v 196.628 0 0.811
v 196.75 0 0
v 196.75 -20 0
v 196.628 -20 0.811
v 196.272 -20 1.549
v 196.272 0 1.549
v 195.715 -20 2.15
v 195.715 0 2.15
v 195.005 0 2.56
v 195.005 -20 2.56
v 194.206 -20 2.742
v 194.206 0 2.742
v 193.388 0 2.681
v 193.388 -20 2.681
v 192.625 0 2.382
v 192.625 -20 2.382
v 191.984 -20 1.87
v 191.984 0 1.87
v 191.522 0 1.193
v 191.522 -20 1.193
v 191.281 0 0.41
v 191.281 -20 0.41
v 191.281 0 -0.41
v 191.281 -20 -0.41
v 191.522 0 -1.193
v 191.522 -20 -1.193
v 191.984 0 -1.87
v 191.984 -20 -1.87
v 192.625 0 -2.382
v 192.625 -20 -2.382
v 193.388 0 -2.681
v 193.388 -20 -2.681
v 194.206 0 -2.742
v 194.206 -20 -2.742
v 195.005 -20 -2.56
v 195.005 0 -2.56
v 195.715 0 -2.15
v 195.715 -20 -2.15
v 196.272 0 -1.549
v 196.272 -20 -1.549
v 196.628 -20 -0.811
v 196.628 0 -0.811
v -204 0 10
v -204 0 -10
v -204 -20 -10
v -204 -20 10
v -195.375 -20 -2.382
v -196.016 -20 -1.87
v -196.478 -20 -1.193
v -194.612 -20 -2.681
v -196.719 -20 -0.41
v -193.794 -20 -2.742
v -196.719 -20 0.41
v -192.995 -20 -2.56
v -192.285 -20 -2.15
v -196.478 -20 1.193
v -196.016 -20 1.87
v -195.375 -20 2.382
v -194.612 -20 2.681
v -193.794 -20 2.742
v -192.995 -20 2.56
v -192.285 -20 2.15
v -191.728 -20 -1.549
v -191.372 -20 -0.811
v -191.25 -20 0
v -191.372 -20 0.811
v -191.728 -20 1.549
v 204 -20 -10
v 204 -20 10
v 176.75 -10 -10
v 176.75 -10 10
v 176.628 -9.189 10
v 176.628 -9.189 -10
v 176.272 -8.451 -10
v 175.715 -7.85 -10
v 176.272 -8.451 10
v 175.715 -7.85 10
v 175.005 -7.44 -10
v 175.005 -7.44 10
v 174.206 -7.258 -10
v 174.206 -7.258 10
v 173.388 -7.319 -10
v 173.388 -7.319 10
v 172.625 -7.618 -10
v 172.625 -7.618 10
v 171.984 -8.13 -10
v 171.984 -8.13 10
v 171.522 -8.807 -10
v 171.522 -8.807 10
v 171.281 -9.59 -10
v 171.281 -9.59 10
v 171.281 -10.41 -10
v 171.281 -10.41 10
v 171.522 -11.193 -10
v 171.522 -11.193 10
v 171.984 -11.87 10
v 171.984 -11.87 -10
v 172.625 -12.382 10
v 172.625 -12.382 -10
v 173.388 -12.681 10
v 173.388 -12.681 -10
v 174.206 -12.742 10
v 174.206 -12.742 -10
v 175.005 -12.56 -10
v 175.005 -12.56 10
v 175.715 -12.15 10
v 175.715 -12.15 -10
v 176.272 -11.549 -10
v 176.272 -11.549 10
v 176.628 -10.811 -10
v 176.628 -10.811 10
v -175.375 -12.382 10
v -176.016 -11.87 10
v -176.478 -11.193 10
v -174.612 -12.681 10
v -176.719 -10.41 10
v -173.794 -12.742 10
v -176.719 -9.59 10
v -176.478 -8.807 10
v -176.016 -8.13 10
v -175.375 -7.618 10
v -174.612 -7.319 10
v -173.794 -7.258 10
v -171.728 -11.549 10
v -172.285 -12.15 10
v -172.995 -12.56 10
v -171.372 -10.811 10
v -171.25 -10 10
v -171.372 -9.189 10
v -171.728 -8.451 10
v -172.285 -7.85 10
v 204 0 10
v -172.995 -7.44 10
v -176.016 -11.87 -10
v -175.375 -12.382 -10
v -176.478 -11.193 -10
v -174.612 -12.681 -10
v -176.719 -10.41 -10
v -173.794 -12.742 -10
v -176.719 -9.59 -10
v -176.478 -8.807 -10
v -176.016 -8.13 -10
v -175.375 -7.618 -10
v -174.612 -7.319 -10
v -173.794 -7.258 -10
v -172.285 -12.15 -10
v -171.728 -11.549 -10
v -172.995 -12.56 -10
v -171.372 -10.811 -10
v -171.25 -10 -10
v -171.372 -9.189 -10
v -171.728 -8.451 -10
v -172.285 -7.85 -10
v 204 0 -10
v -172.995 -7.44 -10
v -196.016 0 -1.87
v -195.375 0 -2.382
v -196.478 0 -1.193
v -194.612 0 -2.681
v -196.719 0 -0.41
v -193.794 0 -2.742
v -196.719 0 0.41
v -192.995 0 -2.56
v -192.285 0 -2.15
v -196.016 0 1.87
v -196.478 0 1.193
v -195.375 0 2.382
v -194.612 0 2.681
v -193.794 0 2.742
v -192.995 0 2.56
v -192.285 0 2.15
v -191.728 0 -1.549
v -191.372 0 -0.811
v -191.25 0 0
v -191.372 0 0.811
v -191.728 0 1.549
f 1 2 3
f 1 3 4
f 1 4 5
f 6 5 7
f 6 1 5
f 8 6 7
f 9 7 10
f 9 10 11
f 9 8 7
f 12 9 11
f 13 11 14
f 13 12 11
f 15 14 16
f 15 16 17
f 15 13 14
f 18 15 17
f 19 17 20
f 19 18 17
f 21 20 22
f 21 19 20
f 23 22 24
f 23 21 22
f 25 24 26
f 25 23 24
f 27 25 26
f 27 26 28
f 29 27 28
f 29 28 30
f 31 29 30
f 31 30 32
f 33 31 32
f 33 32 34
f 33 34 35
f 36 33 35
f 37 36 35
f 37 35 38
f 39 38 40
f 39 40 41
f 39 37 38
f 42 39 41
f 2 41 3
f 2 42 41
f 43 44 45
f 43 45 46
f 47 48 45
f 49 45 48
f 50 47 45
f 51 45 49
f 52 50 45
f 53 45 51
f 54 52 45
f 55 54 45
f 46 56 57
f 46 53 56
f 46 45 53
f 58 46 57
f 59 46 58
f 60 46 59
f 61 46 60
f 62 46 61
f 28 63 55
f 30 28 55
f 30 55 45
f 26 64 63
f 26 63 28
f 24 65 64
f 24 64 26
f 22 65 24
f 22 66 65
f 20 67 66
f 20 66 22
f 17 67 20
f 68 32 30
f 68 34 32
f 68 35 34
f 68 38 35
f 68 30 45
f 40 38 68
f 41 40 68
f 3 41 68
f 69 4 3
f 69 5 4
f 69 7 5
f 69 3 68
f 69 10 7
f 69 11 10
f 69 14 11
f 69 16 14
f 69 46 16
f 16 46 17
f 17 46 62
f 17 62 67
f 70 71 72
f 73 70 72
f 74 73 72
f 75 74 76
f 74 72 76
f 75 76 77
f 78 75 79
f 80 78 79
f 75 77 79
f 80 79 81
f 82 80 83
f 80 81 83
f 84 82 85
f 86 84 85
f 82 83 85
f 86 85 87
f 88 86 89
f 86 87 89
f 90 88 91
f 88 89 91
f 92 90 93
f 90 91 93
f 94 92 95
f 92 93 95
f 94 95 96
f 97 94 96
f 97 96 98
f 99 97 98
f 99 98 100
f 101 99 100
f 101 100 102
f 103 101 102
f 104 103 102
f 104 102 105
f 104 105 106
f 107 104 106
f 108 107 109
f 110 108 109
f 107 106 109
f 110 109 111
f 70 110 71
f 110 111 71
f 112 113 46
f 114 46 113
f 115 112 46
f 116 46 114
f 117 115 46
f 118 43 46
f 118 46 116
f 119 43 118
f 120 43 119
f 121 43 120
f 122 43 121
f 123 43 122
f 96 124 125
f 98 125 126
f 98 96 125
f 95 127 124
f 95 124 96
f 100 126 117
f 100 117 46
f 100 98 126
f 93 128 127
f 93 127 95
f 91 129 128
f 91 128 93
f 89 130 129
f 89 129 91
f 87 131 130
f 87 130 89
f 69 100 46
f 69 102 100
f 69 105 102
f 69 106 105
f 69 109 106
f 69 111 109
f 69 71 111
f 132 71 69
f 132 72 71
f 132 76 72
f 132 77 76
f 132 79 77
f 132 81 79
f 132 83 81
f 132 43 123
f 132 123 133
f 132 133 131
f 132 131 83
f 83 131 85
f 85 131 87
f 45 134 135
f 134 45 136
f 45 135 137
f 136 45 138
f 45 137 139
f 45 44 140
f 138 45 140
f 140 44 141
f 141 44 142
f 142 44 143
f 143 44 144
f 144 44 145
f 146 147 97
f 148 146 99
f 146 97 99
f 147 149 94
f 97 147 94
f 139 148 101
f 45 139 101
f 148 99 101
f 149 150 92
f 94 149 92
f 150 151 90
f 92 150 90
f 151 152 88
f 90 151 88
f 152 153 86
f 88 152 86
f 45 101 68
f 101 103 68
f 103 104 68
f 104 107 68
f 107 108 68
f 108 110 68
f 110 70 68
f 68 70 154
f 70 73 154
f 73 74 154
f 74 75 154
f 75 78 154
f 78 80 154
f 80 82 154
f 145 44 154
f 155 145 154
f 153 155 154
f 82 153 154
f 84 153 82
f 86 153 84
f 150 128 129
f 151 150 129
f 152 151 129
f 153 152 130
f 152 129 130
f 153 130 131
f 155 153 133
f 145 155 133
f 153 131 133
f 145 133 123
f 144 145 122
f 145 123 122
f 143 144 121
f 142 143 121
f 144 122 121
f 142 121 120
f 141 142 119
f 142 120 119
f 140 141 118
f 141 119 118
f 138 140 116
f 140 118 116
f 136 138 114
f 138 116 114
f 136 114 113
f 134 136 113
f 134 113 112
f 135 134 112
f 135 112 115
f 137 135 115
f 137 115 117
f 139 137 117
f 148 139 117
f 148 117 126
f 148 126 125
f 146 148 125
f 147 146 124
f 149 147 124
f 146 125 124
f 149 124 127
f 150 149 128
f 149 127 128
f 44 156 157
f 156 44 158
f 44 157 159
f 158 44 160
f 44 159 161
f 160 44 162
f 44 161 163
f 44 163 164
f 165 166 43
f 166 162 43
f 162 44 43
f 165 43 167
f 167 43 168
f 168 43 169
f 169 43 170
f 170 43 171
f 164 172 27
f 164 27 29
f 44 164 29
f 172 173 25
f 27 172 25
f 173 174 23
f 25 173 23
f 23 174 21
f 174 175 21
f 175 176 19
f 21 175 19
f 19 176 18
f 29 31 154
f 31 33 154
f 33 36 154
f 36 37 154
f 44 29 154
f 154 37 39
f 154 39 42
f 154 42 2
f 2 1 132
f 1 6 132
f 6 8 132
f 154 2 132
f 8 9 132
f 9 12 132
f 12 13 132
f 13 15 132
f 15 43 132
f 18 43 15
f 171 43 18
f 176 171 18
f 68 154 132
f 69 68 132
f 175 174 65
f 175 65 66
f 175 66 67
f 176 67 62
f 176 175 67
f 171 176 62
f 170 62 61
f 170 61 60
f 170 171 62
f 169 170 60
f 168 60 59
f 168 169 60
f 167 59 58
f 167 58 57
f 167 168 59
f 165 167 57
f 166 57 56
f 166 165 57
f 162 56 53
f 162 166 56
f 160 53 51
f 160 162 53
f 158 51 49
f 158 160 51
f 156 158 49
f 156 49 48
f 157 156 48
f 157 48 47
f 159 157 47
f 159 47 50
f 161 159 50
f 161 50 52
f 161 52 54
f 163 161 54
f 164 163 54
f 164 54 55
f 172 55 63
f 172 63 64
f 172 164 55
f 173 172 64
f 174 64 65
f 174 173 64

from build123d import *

# Parameters (mm, degrees)
F0_W     = 408
F0_H     = 20
F0_R     = 2.75
F1_DEPTH = 20
F2_R     = 2.75
F3_DEPTH = 20


with BuildPart() as f1:
    # F0 (on Front) → F1 (new body)
    with BuildSketch(Plane.XZ):
        Rectangle(F0_W, F0_H)
        with Locations((-194, 0)):
            Circle(F0_R, mode=Mode.SUBTRACT)
        with Locations((194, 0)):
            Circle(F0_R, mode=Mode.SUBTRACT)
    extrude(amount=F1_DEPTH)

    # F2 (on face) → F3 (cut)
    with BuildSketch(Plane.XY.offset(10)):
        with Locations((-174, -10)):
            Circle(F2_R)
        with Locations((174, -10)):
            Circle(F2_R)
    extrude(amount=-F3_DEPTH, mode=Mode.SUBTRACT)


solid = f1.part
